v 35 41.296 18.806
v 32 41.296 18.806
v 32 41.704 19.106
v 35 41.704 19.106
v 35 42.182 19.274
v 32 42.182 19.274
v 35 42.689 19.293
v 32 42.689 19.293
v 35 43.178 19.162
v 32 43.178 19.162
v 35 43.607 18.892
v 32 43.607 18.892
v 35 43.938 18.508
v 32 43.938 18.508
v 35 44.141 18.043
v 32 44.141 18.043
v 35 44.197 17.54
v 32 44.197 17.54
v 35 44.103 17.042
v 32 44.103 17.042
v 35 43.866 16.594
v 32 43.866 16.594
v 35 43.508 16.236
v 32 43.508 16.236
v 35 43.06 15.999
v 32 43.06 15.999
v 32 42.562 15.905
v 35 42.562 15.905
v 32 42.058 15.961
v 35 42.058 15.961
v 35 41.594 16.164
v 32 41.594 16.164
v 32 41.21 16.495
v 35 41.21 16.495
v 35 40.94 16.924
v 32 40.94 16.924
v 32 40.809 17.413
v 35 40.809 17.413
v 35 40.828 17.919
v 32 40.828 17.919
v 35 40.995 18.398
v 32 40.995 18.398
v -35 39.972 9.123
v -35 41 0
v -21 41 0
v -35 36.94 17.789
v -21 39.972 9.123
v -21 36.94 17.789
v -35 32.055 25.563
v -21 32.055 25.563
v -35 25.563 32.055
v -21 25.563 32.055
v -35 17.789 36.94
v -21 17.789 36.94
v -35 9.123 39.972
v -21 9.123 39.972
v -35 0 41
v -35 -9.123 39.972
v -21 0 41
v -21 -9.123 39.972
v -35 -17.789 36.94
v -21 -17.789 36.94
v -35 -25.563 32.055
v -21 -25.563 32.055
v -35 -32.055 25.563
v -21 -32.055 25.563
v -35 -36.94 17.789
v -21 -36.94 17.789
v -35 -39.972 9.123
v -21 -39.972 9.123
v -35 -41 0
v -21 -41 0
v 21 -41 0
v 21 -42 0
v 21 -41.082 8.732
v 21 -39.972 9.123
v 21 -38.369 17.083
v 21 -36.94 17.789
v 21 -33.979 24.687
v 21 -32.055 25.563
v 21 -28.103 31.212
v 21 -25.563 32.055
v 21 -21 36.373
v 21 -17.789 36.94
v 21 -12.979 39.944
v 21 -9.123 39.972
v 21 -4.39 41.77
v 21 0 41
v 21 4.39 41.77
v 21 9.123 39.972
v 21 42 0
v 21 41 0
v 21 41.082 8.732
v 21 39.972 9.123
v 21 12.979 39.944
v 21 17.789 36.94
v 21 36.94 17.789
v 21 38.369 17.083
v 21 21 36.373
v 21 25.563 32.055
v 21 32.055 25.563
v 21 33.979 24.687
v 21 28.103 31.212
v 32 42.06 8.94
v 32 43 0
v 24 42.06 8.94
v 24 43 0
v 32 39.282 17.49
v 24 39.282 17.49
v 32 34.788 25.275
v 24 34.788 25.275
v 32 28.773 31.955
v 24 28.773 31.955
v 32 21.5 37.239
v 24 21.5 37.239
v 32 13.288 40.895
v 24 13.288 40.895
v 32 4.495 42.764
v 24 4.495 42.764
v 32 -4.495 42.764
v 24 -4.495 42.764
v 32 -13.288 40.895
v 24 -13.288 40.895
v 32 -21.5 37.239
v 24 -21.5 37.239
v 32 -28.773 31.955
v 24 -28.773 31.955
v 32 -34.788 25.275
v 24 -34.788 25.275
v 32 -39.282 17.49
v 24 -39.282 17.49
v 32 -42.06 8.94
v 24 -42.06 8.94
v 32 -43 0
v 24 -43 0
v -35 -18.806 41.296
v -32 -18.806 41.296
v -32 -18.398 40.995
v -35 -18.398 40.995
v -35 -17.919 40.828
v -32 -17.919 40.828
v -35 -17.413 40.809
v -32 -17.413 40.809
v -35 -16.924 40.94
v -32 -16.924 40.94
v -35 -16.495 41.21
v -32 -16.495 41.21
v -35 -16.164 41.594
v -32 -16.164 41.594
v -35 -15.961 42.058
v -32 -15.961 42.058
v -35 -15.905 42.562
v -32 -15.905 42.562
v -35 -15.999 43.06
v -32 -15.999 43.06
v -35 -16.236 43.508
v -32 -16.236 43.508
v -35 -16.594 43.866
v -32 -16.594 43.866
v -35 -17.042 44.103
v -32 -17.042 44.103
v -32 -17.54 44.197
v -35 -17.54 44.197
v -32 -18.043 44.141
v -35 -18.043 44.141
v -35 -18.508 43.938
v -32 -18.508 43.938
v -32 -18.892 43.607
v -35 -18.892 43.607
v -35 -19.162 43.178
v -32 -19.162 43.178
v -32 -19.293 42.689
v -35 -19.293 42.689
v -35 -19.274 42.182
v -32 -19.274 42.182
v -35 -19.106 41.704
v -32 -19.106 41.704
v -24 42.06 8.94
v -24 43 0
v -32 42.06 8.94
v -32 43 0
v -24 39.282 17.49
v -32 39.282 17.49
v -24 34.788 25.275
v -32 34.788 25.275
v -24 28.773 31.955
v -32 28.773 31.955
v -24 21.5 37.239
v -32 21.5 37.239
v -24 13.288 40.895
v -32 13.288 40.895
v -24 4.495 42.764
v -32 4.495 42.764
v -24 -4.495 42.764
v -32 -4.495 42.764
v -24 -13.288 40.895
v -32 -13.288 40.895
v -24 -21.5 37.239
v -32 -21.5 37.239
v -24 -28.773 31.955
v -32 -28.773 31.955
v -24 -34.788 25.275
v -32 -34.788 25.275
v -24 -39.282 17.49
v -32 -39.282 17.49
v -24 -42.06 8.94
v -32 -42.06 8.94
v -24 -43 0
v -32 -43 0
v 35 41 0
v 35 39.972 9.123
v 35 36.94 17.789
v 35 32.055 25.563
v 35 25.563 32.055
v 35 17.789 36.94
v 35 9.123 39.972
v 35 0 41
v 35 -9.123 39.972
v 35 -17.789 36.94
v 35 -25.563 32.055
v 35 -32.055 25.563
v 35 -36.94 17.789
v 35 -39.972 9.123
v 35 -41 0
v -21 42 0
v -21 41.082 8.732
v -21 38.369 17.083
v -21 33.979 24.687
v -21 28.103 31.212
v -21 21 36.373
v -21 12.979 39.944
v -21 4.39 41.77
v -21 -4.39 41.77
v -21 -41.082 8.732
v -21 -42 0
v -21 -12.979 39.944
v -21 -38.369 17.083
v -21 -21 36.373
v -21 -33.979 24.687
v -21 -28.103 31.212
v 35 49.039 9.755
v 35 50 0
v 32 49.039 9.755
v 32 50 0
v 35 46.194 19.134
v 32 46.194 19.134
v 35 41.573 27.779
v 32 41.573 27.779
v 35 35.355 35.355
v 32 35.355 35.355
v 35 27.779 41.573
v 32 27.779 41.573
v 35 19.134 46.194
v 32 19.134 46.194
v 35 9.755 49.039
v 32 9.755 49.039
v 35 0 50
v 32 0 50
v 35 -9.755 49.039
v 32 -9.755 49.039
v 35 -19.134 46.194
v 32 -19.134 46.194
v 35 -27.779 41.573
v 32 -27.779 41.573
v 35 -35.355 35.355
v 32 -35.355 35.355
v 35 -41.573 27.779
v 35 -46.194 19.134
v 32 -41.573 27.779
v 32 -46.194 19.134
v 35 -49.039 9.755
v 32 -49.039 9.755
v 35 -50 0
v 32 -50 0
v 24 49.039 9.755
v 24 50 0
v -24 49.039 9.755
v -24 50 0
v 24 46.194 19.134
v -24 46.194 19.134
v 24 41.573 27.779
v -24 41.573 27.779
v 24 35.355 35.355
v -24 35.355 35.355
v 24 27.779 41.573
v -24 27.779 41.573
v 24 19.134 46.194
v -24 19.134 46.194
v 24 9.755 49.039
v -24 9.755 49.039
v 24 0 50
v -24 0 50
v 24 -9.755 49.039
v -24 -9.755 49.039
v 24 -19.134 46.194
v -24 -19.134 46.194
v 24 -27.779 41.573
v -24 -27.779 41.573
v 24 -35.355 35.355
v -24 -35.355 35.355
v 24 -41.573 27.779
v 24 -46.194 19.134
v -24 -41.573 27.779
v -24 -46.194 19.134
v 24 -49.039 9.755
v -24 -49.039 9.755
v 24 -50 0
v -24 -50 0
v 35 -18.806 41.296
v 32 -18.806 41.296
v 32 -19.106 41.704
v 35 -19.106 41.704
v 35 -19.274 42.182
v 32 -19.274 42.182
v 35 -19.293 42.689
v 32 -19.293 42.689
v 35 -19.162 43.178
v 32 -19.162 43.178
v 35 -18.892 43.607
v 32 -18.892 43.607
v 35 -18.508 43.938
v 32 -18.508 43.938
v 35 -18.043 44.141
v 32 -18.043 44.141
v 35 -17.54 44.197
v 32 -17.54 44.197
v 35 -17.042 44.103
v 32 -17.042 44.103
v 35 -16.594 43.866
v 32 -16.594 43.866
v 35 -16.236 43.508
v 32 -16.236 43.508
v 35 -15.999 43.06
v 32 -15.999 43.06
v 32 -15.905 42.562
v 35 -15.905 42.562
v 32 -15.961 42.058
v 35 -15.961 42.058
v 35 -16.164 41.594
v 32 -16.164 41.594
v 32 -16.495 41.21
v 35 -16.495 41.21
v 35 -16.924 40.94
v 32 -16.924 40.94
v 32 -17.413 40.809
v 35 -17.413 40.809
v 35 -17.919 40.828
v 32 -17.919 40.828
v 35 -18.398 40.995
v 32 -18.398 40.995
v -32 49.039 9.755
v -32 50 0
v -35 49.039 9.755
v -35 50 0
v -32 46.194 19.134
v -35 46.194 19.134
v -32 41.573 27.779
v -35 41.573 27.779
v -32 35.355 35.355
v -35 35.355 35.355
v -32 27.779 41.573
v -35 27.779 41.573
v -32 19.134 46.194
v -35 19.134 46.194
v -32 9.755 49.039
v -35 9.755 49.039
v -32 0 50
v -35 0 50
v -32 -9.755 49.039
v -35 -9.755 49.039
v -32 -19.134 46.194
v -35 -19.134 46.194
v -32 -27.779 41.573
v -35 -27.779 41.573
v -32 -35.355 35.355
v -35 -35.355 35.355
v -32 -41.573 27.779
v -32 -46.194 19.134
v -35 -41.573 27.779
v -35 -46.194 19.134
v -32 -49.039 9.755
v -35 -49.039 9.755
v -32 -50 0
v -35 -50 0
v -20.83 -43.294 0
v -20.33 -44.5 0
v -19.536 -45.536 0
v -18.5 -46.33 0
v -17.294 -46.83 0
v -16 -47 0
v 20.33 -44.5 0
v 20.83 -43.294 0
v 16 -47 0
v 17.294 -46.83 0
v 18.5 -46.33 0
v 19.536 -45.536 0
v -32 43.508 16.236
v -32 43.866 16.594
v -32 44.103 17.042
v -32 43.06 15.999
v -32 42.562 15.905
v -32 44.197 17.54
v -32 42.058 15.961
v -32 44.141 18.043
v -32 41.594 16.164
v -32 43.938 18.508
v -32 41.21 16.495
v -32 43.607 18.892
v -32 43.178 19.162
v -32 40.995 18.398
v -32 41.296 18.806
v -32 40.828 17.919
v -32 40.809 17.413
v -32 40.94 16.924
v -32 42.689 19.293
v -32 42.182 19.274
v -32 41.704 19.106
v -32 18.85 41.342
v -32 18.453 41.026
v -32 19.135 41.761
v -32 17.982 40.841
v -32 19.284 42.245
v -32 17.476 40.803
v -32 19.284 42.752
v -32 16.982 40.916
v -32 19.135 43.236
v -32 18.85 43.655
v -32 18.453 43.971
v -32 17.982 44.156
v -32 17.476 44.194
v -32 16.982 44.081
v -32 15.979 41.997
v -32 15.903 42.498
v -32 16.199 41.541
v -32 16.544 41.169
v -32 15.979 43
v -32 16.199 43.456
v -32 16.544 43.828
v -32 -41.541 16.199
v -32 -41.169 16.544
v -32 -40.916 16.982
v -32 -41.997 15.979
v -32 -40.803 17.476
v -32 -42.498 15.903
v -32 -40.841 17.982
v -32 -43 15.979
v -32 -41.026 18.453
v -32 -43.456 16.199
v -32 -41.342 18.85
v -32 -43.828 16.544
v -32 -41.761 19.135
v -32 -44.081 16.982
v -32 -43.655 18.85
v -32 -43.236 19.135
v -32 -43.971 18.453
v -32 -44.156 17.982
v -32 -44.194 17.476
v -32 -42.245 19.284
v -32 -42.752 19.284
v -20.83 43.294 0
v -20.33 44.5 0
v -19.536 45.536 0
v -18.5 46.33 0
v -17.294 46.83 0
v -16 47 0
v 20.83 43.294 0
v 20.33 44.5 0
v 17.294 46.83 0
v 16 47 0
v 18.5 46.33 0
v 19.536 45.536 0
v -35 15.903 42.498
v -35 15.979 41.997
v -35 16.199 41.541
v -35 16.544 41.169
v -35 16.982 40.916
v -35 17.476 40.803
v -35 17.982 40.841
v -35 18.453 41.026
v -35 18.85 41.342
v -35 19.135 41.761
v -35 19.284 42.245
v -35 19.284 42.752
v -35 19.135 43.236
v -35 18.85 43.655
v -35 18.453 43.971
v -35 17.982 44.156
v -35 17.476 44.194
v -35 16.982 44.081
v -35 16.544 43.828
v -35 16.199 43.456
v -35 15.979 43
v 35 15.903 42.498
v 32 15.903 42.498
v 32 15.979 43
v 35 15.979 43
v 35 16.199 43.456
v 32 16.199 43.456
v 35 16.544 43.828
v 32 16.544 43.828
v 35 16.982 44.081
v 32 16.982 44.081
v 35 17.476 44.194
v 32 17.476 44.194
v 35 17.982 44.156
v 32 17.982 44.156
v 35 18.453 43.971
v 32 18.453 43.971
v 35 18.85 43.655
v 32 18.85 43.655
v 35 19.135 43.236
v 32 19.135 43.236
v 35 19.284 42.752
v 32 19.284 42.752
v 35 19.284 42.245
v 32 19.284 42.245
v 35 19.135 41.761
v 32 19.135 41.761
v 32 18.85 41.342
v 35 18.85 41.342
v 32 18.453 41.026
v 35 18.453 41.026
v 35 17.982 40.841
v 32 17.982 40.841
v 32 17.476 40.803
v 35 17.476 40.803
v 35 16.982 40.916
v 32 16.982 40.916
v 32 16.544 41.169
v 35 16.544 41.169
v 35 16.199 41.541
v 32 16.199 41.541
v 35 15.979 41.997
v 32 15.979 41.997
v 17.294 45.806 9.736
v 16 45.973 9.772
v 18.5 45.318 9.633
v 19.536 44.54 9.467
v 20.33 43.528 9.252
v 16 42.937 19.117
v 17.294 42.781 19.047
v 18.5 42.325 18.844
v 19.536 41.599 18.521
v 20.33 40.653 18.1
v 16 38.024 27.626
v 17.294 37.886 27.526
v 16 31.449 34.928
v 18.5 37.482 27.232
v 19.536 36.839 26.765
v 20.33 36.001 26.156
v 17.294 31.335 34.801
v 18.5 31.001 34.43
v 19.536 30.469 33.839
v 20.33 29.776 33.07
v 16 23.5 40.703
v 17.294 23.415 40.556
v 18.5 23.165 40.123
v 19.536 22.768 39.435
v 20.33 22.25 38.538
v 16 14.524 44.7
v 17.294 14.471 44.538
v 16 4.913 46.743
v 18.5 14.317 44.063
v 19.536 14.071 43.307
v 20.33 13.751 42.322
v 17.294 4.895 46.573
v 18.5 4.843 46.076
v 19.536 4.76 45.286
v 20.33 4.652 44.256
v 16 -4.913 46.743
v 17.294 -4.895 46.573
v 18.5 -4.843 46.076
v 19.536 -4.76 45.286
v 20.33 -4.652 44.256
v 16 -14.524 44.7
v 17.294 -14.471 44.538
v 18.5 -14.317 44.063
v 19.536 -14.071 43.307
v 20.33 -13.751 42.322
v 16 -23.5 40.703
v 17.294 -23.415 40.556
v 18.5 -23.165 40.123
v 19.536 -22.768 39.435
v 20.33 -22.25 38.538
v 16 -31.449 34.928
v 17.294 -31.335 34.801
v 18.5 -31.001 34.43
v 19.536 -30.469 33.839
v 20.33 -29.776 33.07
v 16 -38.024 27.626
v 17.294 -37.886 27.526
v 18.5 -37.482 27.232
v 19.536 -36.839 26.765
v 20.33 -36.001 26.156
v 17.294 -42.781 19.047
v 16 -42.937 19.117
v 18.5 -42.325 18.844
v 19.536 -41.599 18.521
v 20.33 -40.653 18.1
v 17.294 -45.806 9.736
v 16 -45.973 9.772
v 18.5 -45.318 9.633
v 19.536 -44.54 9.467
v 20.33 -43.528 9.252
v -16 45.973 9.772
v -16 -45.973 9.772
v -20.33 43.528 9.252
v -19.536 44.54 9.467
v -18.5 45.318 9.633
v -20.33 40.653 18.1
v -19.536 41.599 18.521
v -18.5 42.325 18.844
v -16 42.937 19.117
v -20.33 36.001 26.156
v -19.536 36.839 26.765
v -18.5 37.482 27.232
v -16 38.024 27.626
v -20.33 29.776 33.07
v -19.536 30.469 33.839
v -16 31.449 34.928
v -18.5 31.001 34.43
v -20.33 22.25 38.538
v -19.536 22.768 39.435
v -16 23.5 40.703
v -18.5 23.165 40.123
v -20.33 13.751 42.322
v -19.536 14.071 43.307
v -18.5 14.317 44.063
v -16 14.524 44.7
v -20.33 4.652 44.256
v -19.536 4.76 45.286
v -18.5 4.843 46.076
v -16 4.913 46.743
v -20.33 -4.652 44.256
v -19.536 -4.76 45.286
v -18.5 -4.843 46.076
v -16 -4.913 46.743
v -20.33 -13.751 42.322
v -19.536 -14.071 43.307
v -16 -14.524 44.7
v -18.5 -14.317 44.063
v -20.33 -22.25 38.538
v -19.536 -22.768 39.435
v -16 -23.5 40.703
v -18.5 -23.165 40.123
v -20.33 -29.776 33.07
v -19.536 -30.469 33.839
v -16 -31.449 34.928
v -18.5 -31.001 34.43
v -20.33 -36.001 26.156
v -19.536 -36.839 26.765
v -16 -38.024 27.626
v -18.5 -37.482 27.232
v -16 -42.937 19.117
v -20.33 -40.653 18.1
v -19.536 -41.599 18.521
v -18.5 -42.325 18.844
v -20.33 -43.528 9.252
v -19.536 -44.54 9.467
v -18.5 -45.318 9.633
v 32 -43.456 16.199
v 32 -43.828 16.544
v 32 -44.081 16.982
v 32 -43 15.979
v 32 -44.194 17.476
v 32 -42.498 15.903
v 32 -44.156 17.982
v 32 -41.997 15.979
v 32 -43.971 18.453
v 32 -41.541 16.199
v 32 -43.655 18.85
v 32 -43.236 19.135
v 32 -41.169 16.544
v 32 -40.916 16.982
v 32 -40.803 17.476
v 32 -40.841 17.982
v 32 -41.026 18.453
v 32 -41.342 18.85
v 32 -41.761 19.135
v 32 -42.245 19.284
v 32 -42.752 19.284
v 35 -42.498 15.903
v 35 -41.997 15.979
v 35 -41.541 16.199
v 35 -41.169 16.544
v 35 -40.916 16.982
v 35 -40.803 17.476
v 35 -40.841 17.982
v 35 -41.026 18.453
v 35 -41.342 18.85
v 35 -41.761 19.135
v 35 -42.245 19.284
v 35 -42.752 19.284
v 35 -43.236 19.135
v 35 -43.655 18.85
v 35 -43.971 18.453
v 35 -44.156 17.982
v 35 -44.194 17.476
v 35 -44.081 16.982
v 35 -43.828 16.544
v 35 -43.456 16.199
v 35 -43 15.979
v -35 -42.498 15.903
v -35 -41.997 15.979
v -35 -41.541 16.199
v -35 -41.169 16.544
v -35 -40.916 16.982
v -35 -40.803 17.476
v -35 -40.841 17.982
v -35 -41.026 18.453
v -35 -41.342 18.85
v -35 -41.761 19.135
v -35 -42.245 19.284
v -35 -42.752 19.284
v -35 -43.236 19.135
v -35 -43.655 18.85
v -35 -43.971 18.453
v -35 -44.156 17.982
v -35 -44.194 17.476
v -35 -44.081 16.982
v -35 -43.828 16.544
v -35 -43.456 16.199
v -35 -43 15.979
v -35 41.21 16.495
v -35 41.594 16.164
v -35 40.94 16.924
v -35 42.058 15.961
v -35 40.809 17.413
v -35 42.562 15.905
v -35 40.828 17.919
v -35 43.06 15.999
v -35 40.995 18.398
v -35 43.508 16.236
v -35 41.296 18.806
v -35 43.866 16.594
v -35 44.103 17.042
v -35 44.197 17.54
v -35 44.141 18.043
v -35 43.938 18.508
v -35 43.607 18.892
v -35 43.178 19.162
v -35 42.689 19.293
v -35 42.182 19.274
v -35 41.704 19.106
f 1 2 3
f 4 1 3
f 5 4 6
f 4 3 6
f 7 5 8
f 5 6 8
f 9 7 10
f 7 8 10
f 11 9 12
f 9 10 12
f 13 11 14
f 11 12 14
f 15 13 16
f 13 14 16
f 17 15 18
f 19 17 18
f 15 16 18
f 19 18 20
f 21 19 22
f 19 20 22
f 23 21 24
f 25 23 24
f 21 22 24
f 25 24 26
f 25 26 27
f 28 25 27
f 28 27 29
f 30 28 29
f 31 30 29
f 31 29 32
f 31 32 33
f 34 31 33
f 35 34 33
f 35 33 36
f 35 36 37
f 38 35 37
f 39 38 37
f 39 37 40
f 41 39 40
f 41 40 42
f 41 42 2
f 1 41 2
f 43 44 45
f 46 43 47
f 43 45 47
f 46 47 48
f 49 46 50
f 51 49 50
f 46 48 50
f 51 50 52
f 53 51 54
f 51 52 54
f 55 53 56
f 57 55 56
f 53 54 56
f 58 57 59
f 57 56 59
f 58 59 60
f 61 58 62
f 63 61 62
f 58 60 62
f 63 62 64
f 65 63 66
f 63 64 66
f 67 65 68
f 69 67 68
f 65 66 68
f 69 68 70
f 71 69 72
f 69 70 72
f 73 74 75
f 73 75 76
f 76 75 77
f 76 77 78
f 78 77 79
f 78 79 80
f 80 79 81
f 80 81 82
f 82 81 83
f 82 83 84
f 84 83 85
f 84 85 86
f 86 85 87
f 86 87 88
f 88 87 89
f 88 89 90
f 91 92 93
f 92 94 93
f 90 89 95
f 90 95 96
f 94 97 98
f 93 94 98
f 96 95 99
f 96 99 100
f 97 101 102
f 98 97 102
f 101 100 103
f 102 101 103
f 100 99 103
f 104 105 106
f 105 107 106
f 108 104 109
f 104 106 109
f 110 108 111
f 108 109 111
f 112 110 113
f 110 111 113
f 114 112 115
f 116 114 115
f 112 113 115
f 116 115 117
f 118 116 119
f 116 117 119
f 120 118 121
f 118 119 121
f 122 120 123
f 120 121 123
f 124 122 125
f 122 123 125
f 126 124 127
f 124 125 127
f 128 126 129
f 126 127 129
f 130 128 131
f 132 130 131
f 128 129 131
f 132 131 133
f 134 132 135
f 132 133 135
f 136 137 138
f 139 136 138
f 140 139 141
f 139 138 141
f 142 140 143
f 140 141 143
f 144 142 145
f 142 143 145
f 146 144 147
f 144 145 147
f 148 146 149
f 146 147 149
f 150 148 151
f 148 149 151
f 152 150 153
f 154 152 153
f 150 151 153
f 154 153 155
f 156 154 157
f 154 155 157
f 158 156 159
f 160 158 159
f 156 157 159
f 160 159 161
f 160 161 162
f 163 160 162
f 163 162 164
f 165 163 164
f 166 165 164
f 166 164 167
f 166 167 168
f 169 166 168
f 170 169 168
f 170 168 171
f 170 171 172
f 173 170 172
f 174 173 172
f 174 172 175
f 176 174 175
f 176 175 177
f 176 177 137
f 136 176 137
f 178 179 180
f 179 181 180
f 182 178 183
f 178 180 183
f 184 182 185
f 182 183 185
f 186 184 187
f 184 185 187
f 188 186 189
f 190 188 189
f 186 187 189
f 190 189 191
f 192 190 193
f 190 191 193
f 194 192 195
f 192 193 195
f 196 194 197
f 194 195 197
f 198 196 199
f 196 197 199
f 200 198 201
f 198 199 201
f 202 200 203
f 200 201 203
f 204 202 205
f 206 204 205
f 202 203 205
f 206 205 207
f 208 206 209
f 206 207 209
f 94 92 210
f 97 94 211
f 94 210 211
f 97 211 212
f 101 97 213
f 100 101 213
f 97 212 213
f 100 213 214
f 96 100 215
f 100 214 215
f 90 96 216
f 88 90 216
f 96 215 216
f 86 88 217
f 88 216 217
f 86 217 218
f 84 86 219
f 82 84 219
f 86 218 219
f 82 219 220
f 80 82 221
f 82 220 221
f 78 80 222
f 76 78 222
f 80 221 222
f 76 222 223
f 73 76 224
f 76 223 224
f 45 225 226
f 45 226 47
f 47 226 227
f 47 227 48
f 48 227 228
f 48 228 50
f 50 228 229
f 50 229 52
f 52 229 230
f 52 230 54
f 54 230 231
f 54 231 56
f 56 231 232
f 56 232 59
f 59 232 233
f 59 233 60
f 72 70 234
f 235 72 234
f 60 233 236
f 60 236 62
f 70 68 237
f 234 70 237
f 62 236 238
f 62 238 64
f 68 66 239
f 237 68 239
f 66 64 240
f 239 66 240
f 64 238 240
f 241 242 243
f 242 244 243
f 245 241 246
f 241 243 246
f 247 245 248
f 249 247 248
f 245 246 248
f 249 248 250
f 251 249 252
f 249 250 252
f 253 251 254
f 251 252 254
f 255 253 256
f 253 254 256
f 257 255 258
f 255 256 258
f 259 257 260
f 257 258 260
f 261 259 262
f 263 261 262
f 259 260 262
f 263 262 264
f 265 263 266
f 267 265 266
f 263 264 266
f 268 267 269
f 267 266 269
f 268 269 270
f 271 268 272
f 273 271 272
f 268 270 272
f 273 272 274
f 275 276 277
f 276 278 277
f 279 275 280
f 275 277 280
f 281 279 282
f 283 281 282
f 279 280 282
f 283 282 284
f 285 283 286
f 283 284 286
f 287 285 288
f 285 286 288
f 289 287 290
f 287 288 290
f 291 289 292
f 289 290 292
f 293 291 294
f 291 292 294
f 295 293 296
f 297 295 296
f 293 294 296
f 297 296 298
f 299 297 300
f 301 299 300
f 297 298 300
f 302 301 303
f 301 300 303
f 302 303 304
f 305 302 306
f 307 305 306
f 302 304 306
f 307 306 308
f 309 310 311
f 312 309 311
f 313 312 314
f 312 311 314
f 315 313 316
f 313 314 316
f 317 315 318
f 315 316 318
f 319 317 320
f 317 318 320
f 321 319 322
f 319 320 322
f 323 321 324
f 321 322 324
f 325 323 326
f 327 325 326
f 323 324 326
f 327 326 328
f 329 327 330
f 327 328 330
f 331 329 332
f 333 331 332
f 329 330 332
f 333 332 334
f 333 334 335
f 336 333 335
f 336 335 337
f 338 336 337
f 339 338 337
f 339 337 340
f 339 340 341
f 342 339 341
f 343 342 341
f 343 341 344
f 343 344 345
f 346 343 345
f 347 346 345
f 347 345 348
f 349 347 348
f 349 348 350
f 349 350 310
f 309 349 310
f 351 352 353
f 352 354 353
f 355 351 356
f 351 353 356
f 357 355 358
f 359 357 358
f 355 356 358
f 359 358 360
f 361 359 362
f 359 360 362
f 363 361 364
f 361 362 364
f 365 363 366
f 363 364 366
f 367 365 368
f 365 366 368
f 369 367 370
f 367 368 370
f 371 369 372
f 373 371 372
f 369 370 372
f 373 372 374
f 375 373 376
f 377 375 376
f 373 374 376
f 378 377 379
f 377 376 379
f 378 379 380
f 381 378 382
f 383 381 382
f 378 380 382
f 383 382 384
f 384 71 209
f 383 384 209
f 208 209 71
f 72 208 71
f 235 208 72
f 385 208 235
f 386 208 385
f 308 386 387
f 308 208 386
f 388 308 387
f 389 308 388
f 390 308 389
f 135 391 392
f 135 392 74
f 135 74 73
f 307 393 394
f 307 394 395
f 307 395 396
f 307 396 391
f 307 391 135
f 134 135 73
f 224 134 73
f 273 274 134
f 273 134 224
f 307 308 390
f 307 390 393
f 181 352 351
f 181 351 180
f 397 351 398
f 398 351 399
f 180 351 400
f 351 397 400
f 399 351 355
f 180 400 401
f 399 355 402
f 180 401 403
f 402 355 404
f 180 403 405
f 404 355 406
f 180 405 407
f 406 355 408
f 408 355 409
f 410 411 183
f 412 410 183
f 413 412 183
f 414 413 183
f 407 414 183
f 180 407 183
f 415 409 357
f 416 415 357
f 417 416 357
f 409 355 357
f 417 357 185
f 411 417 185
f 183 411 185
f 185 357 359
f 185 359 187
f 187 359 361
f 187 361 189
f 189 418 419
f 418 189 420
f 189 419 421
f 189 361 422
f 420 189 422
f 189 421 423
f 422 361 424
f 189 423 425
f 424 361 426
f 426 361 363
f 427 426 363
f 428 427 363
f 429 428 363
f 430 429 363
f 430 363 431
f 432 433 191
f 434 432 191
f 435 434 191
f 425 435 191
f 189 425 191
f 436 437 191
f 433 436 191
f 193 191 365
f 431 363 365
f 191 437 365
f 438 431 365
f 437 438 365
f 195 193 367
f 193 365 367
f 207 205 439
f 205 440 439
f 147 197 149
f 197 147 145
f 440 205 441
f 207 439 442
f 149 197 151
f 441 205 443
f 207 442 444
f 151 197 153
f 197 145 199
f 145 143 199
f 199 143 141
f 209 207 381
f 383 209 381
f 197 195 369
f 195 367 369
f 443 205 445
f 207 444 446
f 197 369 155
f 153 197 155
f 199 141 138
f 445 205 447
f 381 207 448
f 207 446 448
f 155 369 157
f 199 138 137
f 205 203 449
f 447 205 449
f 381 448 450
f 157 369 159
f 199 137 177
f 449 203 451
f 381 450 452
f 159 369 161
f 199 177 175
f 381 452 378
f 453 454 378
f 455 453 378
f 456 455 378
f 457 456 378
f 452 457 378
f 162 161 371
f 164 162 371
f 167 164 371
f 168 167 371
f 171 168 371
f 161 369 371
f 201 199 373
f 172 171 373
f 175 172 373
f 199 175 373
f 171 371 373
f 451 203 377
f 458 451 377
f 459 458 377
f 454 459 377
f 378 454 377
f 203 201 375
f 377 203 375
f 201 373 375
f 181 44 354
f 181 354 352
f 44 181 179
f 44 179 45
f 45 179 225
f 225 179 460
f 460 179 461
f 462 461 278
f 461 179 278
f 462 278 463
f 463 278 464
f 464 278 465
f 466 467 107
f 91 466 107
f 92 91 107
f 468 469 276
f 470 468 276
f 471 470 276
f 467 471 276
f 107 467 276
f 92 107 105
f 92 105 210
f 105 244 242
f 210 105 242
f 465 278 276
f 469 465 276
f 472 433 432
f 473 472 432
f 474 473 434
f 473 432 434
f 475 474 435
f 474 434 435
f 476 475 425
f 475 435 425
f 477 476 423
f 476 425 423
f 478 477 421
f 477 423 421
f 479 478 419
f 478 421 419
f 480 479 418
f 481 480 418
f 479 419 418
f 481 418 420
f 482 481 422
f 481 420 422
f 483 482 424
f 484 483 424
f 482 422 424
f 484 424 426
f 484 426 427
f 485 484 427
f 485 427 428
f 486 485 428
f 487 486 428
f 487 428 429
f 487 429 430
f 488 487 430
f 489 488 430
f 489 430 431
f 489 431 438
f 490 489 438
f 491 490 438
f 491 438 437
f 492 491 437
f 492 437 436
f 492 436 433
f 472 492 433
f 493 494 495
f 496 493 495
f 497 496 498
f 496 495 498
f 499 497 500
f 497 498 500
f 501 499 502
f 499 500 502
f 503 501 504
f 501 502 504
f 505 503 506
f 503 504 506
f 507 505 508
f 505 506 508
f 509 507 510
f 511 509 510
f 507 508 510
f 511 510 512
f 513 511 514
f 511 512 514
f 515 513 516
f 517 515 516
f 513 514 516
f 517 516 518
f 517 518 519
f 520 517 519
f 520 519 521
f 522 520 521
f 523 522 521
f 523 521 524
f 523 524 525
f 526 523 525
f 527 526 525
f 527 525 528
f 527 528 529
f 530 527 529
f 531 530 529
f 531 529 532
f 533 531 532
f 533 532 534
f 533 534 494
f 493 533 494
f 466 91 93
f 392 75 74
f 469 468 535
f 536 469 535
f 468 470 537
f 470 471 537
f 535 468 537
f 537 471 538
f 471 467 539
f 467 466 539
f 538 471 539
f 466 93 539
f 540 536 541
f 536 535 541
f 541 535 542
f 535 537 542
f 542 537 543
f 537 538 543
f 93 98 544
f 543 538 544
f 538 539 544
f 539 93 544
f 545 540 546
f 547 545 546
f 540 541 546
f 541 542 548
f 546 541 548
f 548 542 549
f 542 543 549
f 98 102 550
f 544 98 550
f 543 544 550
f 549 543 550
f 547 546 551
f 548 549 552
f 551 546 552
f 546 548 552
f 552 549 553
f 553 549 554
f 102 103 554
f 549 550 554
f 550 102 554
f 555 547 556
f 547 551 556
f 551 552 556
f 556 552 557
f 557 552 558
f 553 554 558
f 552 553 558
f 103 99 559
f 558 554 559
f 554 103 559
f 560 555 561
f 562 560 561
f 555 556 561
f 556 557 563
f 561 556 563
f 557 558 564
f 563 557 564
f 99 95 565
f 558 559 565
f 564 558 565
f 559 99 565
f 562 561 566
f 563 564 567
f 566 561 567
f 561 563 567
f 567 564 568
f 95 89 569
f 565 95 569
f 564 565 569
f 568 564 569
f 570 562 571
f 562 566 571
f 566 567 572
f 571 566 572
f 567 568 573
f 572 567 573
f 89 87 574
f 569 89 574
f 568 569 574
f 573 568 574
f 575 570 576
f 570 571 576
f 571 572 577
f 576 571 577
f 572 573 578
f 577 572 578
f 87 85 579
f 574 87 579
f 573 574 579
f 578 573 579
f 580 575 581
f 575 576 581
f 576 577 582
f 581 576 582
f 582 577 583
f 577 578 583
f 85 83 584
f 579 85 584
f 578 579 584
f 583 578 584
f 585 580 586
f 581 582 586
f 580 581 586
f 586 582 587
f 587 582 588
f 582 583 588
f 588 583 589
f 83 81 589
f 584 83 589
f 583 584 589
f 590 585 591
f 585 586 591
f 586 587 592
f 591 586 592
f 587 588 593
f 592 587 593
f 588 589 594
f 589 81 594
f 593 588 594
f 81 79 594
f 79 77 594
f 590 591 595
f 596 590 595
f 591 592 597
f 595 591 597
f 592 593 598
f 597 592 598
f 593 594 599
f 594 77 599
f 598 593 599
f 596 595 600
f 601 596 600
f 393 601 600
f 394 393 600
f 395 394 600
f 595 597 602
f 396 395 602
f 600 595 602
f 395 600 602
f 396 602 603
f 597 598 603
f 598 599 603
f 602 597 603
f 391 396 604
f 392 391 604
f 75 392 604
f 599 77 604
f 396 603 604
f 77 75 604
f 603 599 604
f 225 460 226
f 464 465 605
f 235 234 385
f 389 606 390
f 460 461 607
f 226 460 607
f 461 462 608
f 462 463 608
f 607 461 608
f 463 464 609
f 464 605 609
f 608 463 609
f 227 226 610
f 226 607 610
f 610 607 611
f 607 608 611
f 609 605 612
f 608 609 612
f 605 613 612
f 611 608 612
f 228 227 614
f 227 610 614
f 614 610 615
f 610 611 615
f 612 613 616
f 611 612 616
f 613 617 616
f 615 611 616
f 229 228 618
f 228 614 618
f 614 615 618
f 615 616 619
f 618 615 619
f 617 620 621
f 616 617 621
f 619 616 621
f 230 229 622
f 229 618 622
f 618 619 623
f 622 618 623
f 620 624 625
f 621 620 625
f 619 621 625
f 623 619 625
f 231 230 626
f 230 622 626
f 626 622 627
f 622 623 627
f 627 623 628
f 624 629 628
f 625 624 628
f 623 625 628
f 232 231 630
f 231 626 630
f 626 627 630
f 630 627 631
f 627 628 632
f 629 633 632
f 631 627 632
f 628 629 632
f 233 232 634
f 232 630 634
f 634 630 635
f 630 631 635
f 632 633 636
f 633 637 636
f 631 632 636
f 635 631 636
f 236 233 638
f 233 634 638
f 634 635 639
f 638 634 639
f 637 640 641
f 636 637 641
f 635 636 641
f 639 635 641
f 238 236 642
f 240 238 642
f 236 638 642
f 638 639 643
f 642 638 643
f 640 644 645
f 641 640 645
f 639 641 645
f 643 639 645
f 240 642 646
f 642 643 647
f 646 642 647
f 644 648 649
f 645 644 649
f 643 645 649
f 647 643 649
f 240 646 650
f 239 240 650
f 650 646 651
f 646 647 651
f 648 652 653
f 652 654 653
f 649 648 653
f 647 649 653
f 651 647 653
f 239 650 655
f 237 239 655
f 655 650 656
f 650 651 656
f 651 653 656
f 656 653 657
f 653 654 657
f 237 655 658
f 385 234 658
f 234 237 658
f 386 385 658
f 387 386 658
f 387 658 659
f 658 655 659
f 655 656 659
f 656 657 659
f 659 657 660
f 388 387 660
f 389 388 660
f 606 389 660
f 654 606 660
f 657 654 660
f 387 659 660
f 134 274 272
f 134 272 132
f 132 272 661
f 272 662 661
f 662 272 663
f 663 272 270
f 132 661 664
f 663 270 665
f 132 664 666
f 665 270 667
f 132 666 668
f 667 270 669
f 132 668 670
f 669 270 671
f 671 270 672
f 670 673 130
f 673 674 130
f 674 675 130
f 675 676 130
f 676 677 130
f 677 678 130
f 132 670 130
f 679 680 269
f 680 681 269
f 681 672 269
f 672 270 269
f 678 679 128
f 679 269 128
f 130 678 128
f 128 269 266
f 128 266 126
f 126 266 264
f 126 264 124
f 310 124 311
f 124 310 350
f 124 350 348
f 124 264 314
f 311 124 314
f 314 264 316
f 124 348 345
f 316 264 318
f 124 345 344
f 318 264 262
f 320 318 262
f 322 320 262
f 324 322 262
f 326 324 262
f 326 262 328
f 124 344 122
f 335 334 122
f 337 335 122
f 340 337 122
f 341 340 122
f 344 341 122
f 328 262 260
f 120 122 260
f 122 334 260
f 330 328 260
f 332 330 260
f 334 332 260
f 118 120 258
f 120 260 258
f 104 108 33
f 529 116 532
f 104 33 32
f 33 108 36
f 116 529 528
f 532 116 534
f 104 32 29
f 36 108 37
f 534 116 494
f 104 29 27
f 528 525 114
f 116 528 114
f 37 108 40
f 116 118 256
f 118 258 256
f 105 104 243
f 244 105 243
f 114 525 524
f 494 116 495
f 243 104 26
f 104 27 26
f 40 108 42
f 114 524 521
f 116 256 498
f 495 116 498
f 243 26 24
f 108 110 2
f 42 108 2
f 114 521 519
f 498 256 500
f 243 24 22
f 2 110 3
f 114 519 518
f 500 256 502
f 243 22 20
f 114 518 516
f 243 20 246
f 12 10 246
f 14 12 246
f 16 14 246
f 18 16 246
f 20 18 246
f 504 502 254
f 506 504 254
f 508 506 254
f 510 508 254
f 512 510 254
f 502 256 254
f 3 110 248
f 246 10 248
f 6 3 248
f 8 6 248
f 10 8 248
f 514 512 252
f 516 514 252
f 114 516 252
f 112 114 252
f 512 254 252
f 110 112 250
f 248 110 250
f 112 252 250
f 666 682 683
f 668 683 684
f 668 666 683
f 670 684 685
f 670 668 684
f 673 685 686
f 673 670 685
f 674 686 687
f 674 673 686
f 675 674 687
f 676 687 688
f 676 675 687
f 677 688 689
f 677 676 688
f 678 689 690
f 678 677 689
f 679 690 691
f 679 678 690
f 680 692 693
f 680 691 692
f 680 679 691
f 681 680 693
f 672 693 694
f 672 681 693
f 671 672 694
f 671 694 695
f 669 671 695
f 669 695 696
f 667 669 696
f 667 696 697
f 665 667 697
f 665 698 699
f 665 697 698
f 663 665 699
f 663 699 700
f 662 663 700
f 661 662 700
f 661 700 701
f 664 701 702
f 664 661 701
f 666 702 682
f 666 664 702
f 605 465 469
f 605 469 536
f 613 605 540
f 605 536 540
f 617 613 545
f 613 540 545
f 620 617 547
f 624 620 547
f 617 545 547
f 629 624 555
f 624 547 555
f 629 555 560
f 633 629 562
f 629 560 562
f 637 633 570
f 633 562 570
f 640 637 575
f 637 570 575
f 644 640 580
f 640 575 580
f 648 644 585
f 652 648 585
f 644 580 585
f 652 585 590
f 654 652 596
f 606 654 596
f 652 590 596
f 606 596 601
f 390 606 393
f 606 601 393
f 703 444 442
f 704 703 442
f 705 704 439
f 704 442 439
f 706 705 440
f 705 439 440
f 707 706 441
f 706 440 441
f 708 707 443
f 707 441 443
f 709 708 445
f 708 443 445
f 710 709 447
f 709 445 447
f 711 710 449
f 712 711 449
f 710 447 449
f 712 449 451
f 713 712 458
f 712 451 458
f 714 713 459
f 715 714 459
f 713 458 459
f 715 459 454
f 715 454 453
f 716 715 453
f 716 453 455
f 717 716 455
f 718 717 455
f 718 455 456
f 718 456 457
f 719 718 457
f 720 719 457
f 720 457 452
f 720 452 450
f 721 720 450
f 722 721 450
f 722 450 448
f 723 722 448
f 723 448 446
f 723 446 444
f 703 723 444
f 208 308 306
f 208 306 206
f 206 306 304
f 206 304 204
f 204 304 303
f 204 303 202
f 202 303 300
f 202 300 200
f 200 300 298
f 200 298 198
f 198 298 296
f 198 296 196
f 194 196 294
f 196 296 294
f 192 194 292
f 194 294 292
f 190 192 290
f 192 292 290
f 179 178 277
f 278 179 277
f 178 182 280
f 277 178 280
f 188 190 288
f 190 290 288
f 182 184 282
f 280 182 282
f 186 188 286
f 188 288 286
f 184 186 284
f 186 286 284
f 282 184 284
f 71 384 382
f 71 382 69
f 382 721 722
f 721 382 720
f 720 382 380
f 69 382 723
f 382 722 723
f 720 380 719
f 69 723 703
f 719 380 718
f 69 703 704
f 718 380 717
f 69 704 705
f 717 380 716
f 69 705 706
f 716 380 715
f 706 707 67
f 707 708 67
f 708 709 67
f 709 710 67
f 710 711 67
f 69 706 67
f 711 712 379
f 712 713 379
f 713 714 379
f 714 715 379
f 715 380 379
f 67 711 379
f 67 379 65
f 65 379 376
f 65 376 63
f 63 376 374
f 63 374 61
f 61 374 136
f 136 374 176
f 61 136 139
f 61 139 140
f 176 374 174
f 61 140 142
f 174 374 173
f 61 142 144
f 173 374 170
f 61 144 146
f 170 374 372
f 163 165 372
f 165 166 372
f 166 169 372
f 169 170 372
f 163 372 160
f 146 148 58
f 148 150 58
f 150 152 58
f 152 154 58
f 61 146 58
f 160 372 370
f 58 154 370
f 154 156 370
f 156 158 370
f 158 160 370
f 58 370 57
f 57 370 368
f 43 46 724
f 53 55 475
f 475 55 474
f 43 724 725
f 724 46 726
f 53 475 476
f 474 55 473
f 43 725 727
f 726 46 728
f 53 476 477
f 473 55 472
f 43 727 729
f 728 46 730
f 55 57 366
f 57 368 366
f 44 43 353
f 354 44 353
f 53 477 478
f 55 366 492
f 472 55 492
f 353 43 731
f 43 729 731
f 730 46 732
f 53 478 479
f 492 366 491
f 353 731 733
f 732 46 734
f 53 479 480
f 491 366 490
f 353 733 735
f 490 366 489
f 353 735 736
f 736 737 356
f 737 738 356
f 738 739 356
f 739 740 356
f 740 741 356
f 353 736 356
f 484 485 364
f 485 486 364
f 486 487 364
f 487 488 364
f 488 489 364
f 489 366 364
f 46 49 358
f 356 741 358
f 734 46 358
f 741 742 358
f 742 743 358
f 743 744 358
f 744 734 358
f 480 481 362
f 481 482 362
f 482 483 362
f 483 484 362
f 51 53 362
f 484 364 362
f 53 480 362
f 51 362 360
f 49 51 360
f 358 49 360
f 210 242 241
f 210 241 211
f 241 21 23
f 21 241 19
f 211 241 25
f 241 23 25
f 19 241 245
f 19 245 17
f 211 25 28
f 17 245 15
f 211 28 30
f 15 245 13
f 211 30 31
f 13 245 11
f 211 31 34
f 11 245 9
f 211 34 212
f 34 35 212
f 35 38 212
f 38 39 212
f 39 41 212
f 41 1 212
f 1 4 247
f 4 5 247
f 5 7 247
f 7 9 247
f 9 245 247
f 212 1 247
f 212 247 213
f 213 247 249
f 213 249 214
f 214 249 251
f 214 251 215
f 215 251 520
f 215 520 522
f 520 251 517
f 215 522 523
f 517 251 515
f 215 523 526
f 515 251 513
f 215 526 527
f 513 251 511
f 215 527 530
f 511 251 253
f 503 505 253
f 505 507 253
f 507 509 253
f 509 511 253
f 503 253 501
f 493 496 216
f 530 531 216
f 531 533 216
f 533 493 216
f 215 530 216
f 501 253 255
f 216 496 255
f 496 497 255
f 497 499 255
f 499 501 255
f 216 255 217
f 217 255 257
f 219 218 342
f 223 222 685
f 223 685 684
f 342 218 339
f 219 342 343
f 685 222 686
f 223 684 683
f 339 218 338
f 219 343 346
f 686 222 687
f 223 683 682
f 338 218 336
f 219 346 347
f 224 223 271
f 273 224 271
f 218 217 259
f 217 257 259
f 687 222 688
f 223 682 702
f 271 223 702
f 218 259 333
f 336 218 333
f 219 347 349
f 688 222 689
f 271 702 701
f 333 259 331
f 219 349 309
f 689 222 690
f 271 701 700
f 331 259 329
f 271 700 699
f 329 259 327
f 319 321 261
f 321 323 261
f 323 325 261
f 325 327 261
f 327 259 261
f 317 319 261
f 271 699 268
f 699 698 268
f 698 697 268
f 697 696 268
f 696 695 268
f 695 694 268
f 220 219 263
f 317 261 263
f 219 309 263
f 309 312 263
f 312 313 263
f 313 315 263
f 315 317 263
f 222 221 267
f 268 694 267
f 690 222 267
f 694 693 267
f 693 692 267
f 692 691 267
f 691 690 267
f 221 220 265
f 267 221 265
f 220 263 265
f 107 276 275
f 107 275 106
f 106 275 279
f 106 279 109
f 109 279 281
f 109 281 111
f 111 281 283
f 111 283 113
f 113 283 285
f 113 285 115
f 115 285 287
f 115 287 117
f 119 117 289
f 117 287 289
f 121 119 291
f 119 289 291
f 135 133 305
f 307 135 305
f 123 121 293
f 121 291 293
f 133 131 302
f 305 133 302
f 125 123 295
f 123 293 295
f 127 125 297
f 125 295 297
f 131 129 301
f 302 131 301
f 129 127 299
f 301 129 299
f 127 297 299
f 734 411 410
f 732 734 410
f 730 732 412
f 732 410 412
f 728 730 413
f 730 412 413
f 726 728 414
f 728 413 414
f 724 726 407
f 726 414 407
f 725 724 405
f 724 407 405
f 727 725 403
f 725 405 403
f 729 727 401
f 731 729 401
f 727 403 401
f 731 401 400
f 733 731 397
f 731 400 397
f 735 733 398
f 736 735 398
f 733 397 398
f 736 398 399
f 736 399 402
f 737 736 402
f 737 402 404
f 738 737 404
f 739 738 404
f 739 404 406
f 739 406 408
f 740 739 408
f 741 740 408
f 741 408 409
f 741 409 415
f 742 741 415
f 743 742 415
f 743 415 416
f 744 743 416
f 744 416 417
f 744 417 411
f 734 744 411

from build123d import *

# Parameters (mm, degrees)
REVOLVE_1_ANGLE          = 180
HOLE_WIZARD_M3_1_D       = 3.4
HOLE_WIZARD_M3_1_DEPTH   = 3
PATTERN_CIRCULAR_1_COUNT = 4
PATTERN_CIRCULAR_1_ANGLE = 135
MIRROR_1_COPY_1_D        = 3.4
MIRROR_1_COPY_1_DEPTH    = 3
MIRROR_1_COPY_2_D        = 3.4
MIRROR_1_COPY_2_DEPTH    = 3
MIRROR_1_COPY_3_D        = 3.4
MIRROR_1_COPY_3_DEPTH    = 3
FILLET_1_R               = 5


with BuildPart() as part:
    # ｽｹｯﾁ1 → 回転1 (revolve)
    with BuildSketch(Plane.XY):
        Polygon((-35, 41), (-21, 41), (-21, 47), (21, 47), (21, 41), (35, 41), (35, 50), (32, 50), (32, 43), (24, 43), (24, 50), (-24, 50), (-24, 43), (-32, 43), (-32, 50), (-35, 50), align=None)
    revolve(axis=Axis((-50, 0, 0), (1, 0, 0)), revolution_arc=REVOLVE_1_ANGLE)

    # M3 すきま穴1
    with Locations(Plane.ZY.offset(35)):
        with Locations((17.603437889, -42.498458496)):
            hole_wizard_m3_1 = Hole(HOLE_WIZARD_M3_1_D / 2, depth=HOLE_WIZARD_M3_1_DEPTH)

    # 円形ﾊﾟﾀｰﾝ1: M3 すきま穴1 ×4 about axis
    pattern_circular_1_axis = Axis((0, 0, 0), (-1, 0, 0))
    for i in range(1, PATTERN_CIRCULAR_1_COUNT):
        add(hole_wizard_m3_1.rotate(pattern_circular_1_axis, i * PATTERN_CIRCULAR_1_ANGLE / (PATTERN_CIRCULAR_1_COUNT - 1)), mode=Mode.SUBTRACT)

    # ﾐﾗｰ1: M3 すきま穴1 across plane
    add(hole_wizard_m3_1.mirror(Plane(origin=(0, 0, 0), x_dir=(0, 0, 1), z_dir=(1, 0, 0))), mode=Mode.SUBTRACT)

    # ﾐﾗｰ1 copy 1
    with Locations(Plane(origin=(35, 0, 0), x_dir=(0, 0.7071067811865487, 0.7071067811865464), z_dir=(1, 0, 0))):
        with Locations((17.603437889, 42.498458496)):
            Hole(MIRROR_1_COPY_1_D / 2, depth=MIRROR_1_COPY_1_DEPTH)

    # ﾐﾗｰ1 copy 2
    with Locations(Plane.YZ.offset(35)):
        with Locations((17.603437889, 42.498458496)):
            Hole(MIRROR_1_COPY_2_D / 2, depth=MIRROR_1_COPY_2_DEPTH)

    # ﾐﾗｰ1 copy 3
    with Locations(Plane(origin=(35, 0, 0), x_dir=(0, 0.7071067811865441, -0.7071067811865509), z_dir=(1, 0, 0))):
        with Locations((17.603437889, 42.498458496)):
            Hole(MIRROR_1_COPY_3_D / 2, depth=MIRROR_1_COPY_3_DEPTH)

    # ﾌｨﾚｯﾄ1
    fillet_1_edges = [part.edges().sort_by_distance(p)[0] for p in [
        (21, 0, 47),
        (-21, 0, 47),
    ]]
    fillet(fillet_1_edges, radius=FILLET_1_R)


solid = part.part
